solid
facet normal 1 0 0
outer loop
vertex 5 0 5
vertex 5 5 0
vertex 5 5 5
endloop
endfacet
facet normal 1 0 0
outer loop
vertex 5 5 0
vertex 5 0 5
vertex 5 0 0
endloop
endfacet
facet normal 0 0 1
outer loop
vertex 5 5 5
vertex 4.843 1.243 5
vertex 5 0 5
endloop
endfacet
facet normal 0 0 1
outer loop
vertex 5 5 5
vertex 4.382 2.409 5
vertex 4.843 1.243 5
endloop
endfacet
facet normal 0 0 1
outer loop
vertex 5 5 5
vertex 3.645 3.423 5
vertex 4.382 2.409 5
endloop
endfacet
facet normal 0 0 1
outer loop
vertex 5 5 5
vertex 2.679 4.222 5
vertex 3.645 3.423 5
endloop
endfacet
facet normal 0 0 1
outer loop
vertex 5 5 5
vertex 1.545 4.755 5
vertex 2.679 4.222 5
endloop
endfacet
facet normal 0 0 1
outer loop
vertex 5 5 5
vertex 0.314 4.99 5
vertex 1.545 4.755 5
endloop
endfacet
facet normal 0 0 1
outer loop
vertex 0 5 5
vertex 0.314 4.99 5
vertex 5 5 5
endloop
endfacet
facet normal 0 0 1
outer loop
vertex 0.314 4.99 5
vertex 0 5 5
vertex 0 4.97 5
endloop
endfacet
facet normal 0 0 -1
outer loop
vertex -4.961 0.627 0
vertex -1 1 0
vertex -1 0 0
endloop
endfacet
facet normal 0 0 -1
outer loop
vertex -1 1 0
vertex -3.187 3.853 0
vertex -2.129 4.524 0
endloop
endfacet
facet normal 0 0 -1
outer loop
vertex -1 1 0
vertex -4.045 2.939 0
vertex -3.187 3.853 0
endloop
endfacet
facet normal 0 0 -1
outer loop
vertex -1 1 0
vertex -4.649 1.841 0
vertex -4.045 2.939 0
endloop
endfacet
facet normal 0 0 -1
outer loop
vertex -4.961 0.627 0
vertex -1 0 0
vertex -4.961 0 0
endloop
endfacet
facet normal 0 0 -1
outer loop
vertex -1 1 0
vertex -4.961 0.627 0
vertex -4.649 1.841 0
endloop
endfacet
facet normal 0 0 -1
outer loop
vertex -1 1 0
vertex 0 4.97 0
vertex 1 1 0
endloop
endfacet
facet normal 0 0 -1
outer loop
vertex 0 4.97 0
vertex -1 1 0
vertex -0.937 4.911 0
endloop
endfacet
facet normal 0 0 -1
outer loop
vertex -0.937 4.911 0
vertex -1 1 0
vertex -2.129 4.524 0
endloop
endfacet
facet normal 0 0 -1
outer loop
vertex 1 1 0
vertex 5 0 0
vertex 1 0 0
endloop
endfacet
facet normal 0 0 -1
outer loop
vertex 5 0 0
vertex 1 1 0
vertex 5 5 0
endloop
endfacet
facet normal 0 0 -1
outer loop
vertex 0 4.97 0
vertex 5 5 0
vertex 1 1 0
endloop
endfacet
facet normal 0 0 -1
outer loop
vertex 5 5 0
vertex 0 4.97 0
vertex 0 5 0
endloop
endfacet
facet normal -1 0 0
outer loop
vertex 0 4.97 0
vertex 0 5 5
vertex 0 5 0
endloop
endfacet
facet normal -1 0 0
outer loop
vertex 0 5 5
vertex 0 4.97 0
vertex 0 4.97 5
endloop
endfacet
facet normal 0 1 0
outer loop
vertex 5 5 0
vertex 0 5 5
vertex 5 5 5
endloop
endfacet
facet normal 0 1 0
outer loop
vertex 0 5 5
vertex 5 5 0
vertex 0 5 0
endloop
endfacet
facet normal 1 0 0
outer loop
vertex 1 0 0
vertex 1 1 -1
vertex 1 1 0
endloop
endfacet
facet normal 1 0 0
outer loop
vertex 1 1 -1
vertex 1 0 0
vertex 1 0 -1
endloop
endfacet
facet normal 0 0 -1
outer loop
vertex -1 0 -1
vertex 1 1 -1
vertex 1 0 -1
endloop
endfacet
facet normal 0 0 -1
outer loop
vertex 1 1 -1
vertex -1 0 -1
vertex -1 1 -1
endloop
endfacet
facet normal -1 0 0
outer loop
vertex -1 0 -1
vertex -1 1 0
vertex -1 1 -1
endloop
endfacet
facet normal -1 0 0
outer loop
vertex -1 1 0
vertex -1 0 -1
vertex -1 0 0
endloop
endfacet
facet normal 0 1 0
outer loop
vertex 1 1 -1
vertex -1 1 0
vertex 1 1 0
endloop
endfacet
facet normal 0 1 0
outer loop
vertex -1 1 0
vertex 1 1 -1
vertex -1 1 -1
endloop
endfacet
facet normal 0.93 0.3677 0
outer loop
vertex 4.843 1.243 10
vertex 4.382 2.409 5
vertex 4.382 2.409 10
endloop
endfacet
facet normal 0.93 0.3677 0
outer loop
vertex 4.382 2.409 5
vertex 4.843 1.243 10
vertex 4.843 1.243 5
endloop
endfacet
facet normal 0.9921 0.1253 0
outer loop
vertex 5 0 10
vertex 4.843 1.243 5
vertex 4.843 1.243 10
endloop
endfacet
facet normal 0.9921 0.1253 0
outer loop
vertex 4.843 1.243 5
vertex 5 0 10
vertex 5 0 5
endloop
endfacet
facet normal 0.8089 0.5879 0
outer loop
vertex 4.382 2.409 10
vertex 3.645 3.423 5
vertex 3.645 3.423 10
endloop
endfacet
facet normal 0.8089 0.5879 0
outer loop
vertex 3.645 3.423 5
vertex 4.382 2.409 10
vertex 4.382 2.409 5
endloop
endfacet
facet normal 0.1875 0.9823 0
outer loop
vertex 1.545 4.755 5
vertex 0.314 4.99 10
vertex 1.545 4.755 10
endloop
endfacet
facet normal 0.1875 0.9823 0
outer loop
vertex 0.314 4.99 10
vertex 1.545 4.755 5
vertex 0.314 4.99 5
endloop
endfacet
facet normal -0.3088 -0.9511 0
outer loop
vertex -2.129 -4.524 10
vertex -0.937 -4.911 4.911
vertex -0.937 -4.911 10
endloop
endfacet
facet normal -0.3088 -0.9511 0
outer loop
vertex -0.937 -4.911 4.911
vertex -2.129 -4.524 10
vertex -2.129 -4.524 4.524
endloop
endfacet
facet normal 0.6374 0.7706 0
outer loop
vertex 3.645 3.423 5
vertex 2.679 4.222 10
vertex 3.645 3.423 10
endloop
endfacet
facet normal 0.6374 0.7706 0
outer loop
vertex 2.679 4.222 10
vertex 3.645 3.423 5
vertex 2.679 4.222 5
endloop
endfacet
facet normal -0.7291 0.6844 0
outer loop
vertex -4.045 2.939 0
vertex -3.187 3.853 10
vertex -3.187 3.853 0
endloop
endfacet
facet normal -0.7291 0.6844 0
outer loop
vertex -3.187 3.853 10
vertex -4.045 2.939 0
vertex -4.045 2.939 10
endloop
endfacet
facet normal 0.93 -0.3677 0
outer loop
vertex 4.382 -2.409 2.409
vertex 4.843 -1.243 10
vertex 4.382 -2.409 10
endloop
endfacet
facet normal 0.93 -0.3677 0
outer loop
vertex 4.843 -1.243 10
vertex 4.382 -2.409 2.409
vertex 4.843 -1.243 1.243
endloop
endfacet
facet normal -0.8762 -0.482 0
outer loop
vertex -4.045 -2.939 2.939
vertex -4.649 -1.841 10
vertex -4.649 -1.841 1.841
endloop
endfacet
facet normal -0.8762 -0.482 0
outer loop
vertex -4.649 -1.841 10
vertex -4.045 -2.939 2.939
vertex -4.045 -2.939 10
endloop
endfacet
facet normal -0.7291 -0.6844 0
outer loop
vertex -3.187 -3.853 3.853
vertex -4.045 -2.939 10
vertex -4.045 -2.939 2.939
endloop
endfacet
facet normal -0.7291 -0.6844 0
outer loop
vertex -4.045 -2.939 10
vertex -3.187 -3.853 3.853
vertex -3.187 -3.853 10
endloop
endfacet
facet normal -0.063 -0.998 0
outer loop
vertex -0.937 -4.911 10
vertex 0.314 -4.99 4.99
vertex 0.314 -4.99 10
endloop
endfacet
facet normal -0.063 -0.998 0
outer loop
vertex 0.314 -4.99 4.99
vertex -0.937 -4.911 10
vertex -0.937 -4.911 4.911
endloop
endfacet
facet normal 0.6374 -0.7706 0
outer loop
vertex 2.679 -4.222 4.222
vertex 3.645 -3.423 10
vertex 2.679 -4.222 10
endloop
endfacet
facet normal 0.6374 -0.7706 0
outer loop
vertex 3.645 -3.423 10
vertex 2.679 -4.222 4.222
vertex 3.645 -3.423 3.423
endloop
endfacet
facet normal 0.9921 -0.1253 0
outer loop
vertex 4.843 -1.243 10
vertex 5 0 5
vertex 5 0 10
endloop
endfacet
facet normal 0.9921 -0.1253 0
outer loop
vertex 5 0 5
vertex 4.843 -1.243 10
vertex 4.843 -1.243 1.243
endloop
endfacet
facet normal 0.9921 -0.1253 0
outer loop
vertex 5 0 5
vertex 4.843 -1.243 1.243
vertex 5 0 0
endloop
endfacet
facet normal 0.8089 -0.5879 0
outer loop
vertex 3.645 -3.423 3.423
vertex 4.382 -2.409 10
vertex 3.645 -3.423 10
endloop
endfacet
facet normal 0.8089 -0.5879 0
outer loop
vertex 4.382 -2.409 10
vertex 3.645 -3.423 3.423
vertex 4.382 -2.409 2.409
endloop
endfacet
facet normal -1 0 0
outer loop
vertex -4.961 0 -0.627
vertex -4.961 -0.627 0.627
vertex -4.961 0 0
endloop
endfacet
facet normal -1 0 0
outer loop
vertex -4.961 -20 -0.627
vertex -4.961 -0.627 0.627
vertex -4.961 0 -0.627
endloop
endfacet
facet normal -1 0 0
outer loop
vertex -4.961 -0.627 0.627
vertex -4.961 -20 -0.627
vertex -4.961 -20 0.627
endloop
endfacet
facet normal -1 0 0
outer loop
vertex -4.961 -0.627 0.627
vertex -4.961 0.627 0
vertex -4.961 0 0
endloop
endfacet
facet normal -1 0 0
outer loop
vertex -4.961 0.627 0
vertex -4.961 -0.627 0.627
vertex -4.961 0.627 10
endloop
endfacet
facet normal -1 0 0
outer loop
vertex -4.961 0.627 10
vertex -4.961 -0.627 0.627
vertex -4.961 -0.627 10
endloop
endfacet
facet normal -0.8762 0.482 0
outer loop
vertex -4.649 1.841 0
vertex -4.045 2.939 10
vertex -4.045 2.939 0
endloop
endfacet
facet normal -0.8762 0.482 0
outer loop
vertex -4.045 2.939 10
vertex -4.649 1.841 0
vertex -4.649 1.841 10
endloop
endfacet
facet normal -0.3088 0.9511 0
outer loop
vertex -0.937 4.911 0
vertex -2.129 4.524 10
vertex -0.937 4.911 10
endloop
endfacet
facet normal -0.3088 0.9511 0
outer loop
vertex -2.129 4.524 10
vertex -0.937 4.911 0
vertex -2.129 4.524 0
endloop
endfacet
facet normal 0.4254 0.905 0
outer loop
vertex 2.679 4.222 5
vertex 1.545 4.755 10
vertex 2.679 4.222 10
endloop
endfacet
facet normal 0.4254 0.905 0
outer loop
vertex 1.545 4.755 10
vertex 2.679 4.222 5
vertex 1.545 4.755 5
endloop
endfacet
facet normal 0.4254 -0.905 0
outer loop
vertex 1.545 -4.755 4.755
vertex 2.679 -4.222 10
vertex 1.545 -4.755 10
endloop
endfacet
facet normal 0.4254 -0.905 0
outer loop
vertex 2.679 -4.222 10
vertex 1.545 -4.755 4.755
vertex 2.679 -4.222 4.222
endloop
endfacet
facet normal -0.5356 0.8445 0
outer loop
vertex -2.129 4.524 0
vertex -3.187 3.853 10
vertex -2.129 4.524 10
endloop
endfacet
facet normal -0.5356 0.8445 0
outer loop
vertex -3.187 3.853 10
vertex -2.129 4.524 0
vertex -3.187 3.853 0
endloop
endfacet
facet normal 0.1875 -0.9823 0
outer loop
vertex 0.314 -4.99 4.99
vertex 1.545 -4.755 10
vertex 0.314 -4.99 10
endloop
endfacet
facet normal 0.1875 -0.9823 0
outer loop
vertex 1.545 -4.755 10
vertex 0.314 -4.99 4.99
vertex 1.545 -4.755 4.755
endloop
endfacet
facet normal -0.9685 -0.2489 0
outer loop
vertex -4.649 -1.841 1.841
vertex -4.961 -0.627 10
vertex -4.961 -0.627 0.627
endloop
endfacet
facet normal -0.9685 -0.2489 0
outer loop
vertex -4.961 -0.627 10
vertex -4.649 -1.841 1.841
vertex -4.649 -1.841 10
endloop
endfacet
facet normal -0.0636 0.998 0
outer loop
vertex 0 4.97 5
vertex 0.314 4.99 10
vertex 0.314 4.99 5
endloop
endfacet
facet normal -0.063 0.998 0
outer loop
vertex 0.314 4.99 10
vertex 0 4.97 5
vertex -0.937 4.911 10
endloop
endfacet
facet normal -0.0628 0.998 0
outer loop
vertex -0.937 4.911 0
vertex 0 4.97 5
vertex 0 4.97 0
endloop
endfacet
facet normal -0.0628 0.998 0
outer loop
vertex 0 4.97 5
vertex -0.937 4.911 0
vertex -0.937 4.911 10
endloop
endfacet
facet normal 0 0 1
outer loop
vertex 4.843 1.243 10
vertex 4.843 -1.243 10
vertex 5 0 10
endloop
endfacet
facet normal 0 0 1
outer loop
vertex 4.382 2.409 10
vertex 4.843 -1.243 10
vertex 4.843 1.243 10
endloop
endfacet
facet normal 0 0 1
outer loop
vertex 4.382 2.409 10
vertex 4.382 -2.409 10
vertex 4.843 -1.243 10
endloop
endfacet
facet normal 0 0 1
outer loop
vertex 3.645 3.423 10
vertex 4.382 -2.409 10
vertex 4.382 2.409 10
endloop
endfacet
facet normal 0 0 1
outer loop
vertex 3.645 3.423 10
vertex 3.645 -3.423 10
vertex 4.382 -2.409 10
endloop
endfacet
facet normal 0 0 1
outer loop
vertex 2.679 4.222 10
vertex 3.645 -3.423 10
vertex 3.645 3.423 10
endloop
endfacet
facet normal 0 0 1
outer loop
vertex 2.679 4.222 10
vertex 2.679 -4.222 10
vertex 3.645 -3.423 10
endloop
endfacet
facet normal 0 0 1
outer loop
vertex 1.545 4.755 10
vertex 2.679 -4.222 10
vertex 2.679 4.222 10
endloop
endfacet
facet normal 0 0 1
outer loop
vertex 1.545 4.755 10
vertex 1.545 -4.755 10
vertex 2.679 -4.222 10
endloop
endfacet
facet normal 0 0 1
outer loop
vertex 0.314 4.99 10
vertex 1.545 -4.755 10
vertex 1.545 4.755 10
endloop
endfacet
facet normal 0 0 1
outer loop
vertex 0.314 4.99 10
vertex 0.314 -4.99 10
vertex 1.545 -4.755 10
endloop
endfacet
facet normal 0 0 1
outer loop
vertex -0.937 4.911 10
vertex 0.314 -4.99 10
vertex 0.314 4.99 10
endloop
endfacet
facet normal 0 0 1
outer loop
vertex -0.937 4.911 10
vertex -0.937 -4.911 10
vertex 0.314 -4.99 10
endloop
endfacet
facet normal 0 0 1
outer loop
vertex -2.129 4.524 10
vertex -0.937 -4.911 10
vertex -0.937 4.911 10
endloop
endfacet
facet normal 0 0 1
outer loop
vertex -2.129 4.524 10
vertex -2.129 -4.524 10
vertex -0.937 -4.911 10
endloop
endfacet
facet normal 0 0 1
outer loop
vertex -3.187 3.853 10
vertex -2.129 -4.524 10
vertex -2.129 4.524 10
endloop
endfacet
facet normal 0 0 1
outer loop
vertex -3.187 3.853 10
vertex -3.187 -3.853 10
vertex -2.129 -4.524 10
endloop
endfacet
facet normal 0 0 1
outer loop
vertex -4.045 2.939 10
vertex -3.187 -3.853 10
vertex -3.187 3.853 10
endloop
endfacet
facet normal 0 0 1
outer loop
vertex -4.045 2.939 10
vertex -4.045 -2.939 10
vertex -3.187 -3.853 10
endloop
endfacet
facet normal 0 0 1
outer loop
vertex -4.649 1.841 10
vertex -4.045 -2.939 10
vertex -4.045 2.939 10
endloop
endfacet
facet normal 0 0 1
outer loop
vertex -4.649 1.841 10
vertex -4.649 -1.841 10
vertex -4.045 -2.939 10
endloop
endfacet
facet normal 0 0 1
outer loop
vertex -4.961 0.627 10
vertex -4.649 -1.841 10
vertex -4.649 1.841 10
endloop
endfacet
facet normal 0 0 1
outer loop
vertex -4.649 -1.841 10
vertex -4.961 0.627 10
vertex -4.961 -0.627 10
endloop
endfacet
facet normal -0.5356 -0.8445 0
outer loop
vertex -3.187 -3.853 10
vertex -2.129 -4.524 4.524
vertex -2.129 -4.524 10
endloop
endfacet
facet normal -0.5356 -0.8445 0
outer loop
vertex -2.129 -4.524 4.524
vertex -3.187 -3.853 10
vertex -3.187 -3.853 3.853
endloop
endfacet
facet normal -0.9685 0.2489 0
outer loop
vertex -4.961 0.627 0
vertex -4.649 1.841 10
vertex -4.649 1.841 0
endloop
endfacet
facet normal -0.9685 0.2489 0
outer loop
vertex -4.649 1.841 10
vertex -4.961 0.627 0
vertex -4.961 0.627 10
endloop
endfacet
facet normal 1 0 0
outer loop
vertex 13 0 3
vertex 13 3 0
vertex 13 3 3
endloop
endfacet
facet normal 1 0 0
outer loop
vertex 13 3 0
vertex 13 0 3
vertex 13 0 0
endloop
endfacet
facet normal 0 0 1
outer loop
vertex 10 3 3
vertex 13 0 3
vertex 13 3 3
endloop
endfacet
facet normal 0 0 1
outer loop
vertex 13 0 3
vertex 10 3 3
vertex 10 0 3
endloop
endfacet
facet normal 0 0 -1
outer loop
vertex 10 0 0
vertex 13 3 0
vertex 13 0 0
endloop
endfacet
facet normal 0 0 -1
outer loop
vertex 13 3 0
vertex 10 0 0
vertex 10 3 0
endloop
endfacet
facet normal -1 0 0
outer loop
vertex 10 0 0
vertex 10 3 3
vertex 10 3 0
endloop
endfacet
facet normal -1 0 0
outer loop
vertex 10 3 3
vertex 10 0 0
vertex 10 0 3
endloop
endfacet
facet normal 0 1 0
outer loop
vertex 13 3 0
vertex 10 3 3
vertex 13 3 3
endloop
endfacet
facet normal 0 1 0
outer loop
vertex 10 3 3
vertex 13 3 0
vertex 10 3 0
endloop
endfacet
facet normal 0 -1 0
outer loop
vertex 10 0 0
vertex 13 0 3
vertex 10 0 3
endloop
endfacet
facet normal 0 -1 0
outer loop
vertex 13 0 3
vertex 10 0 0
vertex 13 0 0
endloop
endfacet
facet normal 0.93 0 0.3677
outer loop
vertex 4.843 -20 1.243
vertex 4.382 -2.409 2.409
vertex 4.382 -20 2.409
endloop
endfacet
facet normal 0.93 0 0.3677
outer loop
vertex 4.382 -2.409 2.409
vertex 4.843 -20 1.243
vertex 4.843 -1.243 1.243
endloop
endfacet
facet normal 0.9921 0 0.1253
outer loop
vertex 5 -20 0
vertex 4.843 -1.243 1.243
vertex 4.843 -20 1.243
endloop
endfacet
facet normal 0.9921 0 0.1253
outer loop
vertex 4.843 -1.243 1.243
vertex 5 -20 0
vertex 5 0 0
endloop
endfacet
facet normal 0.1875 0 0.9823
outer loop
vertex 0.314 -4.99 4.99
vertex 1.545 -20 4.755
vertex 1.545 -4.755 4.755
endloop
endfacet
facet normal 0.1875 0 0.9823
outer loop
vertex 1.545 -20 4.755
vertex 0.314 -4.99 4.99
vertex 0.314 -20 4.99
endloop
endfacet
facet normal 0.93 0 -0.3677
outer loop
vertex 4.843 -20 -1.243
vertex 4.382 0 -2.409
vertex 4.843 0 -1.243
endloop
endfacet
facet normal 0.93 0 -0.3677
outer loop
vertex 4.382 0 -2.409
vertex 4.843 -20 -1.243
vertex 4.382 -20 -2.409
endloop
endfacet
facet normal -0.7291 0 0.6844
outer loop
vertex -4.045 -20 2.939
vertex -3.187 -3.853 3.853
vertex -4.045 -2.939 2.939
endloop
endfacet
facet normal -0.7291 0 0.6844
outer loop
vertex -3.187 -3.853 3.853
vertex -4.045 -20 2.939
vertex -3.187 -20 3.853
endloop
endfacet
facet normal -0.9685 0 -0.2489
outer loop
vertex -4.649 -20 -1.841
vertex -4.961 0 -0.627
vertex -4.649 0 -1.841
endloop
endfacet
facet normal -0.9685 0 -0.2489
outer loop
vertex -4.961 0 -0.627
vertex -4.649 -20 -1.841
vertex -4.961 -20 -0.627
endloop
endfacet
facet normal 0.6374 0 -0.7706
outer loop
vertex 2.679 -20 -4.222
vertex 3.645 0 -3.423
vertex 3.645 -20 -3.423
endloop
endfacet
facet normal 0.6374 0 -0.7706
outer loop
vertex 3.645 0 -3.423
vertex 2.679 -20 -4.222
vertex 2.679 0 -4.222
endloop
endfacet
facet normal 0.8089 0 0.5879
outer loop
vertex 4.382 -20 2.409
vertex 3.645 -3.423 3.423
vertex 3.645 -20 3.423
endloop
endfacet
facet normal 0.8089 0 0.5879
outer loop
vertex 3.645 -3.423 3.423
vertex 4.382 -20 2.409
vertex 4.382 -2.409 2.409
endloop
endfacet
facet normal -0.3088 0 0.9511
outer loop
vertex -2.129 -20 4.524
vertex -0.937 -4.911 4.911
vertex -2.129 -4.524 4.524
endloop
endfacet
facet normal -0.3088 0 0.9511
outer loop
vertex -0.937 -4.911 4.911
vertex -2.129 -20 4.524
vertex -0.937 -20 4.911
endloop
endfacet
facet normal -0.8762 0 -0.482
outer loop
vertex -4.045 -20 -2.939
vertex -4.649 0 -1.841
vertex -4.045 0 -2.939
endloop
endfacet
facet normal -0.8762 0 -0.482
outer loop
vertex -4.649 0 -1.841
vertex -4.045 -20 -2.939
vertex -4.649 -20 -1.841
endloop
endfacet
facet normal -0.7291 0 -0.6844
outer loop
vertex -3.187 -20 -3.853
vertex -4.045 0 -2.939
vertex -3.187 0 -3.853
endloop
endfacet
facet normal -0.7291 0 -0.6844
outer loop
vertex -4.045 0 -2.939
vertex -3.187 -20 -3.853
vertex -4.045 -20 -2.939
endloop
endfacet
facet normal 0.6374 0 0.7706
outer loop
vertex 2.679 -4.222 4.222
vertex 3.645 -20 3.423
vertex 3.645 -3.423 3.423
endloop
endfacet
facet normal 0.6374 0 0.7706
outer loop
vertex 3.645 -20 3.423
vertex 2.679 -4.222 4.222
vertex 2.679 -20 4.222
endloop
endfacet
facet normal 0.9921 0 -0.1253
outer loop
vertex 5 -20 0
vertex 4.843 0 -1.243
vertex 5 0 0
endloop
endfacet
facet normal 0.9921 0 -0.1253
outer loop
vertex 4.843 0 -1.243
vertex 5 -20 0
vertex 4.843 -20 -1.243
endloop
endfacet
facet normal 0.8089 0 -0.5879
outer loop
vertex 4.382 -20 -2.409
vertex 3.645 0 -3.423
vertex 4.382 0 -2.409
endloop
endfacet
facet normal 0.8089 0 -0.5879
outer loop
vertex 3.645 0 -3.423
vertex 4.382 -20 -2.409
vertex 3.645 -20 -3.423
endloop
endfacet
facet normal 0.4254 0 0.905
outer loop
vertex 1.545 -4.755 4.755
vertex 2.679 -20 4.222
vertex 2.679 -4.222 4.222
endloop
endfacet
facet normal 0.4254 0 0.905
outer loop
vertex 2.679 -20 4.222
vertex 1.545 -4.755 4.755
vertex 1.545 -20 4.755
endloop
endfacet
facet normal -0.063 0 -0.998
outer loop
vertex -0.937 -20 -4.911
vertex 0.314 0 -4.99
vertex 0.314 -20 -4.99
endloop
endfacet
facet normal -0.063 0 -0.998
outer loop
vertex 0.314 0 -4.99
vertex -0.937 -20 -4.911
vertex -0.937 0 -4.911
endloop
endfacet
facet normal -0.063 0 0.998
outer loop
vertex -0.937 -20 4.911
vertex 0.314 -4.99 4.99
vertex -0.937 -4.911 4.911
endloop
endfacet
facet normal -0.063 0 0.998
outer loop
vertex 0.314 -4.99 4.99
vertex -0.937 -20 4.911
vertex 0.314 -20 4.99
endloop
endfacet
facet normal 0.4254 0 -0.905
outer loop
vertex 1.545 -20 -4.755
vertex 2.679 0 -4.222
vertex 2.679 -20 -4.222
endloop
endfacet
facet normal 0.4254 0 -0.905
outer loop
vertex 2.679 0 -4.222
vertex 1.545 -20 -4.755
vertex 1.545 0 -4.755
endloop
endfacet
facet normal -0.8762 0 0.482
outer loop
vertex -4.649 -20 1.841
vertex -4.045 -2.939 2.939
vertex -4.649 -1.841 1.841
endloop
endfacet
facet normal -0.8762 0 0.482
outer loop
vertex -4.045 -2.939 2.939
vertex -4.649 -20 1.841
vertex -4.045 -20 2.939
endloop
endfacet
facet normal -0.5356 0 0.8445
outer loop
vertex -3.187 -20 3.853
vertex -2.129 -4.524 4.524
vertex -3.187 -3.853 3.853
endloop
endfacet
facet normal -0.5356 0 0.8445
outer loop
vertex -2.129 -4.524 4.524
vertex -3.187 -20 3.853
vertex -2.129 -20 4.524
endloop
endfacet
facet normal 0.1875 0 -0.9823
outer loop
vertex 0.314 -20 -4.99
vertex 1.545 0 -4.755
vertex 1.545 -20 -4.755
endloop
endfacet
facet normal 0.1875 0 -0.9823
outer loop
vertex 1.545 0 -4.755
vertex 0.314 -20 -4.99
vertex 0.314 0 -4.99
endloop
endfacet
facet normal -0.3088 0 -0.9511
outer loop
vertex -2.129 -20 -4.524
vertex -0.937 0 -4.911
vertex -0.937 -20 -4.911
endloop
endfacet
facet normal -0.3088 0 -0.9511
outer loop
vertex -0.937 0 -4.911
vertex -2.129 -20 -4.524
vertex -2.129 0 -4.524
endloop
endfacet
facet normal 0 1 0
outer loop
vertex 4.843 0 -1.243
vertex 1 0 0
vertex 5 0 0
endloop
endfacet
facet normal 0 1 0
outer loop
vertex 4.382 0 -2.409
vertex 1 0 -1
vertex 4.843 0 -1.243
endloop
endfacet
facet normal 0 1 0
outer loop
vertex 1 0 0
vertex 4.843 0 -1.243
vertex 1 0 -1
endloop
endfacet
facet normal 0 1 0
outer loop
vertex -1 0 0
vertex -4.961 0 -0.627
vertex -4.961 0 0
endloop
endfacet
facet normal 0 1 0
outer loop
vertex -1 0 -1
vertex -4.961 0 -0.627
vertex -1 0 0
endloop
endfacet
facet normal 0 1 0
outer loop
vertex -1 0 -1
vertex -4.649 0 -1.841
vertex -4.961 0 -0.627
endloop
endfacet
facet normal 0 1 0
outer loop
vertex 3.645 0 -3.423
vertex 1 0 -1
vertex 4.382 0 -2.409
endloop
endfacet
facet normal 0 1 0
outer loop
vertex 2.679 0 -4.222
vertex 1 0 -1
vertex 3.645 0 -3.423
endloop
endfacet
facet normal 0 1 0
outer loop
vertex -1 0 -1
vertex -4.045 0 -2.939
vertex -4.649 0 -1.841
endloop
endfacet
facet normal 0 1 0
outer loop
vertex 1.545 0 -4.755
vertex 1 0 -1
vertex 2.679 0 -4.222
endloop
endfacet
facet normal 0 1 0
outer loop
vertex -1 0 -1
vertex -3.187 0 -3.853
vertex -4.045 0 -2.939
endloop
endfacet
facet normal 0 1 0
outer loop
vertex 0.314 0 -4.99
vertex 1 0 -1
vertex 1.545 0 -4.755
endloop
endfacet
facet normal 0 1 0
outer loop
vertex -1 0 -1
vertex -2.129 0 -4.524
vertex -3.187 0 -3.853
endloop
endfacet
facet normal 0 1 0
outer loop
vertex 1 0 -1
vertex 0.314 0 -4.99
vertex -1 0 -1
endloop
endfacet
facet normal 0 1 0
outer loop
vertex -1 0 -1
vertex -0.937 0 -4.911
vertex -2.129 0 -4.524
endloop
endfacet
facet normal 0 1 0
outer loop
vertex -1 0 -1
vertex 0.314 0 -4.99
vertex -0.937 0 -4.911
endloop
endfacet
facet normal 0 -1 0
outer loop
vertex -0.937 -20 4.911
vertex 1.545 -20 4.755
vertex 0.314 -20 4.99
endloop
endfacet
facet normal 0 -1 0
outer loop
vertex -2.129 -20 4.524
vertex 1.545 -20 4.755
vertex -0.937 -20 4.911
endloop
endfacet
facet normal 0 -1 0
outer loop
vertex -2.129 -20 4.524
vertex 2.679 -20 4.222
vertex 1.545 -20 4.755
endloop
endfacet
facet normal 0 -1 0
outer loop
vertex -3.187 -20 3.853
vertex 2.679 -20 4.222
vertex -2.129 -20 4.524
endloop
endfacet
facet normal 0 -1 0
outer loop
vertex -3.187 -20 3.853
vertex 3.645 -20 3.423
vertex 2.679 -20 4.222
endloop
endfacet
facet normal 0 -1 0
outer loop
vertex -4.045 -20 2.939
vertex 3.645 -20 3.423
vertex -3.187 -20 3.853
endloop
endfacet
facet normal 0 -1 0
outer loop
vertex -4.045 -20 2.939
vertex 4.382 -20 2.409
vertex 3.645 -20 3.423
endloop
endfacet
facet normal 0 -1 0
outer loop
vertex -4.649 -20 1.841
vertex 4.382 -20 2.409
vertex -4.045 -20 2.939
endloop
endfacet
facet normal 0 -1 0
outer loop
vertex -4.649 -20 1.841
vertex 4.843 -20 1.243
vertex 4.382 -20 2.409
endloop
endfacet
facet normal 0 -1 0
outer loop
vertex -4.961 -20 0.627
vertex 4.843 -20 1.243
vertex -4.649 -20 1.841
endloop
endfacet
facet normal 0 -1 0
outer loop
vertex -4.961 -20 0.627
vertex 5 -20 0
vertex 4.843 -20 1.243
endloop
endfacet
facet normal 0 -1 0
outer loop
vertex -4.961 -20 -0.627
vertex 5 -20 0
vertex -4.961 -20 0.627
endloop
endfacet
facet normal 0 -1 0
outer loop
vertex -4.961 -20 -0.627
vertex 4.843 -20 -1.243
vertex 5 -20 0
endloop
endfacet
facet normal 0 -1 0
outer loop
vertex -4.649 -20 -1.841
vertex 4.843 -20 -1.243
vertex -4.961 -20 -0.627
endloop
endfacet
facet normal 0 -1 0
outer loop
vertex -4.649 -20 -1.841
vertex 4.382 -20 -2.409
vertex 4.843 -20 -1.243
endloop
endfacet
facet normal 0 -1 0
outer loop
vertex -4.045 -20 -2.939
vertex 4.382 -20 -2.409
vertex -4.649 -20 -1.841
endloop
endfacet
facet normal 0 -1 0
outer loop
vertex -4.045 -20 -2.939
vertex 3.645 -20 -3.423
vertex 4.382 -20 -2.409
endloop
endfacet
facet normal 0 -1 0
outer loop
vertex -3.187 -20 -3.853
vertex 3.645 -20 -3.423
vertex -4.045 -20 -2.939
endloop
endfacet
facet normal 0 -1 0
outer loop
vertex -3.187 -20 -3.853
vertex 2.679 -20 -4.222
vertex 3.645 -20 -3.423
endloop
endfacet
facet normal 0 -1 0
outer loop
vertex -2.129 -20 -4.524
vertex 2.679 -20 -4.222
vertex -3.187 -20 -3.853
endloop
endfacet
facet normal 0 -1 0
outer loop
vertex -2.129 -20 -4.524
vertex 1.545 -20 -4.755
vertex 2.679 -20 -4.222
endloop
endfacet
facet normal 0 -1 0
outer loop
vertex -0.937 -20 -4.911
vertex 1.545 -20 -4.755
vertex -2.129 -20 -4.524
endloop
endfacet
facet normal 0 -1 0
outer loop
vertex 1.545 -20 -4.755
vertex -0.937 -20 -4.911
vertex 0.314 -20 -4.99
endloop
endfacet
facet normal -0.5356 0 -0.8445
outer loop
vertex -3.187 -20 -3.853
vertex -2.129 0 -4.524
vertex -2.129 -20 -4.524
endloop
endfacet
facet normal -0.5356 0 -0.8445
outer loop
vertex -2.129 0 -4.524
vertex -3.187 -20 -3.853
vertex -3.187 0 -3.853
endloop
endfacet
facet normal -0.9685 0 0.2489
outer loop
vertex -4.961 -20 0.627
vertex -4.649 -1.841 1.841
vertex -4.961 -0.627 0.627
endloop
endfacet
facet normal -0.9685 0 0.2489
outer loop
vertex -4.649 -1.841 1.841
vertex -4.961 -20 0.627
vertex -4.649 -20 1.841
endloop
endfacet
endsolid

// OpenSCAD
//facet number
$fn=25; //Facets in spherical primitives
        //Think of this as resolution

//cube
cube([5,5,5]);
cube([2,2,2], center=true);

//sphere
%sphere(10); //% sign makes transparent
  
//cylinder
cylinder(r1=5, r2=5, h=10);

//translation
translate([10,0,0]) cube([3,3,3]); //translate is an operation

//rotate
rotate(a=90, v=[1,0,0]) cylinder(r1=5, r2=5, h=20);
//a=angle, v=vector rotate around axis 

//loop
*for(i=[10:10:100]) {
#translate([15,i,0]) cylinder(r1=5, r2=1, h=10);
}
//*disables a code snippet
